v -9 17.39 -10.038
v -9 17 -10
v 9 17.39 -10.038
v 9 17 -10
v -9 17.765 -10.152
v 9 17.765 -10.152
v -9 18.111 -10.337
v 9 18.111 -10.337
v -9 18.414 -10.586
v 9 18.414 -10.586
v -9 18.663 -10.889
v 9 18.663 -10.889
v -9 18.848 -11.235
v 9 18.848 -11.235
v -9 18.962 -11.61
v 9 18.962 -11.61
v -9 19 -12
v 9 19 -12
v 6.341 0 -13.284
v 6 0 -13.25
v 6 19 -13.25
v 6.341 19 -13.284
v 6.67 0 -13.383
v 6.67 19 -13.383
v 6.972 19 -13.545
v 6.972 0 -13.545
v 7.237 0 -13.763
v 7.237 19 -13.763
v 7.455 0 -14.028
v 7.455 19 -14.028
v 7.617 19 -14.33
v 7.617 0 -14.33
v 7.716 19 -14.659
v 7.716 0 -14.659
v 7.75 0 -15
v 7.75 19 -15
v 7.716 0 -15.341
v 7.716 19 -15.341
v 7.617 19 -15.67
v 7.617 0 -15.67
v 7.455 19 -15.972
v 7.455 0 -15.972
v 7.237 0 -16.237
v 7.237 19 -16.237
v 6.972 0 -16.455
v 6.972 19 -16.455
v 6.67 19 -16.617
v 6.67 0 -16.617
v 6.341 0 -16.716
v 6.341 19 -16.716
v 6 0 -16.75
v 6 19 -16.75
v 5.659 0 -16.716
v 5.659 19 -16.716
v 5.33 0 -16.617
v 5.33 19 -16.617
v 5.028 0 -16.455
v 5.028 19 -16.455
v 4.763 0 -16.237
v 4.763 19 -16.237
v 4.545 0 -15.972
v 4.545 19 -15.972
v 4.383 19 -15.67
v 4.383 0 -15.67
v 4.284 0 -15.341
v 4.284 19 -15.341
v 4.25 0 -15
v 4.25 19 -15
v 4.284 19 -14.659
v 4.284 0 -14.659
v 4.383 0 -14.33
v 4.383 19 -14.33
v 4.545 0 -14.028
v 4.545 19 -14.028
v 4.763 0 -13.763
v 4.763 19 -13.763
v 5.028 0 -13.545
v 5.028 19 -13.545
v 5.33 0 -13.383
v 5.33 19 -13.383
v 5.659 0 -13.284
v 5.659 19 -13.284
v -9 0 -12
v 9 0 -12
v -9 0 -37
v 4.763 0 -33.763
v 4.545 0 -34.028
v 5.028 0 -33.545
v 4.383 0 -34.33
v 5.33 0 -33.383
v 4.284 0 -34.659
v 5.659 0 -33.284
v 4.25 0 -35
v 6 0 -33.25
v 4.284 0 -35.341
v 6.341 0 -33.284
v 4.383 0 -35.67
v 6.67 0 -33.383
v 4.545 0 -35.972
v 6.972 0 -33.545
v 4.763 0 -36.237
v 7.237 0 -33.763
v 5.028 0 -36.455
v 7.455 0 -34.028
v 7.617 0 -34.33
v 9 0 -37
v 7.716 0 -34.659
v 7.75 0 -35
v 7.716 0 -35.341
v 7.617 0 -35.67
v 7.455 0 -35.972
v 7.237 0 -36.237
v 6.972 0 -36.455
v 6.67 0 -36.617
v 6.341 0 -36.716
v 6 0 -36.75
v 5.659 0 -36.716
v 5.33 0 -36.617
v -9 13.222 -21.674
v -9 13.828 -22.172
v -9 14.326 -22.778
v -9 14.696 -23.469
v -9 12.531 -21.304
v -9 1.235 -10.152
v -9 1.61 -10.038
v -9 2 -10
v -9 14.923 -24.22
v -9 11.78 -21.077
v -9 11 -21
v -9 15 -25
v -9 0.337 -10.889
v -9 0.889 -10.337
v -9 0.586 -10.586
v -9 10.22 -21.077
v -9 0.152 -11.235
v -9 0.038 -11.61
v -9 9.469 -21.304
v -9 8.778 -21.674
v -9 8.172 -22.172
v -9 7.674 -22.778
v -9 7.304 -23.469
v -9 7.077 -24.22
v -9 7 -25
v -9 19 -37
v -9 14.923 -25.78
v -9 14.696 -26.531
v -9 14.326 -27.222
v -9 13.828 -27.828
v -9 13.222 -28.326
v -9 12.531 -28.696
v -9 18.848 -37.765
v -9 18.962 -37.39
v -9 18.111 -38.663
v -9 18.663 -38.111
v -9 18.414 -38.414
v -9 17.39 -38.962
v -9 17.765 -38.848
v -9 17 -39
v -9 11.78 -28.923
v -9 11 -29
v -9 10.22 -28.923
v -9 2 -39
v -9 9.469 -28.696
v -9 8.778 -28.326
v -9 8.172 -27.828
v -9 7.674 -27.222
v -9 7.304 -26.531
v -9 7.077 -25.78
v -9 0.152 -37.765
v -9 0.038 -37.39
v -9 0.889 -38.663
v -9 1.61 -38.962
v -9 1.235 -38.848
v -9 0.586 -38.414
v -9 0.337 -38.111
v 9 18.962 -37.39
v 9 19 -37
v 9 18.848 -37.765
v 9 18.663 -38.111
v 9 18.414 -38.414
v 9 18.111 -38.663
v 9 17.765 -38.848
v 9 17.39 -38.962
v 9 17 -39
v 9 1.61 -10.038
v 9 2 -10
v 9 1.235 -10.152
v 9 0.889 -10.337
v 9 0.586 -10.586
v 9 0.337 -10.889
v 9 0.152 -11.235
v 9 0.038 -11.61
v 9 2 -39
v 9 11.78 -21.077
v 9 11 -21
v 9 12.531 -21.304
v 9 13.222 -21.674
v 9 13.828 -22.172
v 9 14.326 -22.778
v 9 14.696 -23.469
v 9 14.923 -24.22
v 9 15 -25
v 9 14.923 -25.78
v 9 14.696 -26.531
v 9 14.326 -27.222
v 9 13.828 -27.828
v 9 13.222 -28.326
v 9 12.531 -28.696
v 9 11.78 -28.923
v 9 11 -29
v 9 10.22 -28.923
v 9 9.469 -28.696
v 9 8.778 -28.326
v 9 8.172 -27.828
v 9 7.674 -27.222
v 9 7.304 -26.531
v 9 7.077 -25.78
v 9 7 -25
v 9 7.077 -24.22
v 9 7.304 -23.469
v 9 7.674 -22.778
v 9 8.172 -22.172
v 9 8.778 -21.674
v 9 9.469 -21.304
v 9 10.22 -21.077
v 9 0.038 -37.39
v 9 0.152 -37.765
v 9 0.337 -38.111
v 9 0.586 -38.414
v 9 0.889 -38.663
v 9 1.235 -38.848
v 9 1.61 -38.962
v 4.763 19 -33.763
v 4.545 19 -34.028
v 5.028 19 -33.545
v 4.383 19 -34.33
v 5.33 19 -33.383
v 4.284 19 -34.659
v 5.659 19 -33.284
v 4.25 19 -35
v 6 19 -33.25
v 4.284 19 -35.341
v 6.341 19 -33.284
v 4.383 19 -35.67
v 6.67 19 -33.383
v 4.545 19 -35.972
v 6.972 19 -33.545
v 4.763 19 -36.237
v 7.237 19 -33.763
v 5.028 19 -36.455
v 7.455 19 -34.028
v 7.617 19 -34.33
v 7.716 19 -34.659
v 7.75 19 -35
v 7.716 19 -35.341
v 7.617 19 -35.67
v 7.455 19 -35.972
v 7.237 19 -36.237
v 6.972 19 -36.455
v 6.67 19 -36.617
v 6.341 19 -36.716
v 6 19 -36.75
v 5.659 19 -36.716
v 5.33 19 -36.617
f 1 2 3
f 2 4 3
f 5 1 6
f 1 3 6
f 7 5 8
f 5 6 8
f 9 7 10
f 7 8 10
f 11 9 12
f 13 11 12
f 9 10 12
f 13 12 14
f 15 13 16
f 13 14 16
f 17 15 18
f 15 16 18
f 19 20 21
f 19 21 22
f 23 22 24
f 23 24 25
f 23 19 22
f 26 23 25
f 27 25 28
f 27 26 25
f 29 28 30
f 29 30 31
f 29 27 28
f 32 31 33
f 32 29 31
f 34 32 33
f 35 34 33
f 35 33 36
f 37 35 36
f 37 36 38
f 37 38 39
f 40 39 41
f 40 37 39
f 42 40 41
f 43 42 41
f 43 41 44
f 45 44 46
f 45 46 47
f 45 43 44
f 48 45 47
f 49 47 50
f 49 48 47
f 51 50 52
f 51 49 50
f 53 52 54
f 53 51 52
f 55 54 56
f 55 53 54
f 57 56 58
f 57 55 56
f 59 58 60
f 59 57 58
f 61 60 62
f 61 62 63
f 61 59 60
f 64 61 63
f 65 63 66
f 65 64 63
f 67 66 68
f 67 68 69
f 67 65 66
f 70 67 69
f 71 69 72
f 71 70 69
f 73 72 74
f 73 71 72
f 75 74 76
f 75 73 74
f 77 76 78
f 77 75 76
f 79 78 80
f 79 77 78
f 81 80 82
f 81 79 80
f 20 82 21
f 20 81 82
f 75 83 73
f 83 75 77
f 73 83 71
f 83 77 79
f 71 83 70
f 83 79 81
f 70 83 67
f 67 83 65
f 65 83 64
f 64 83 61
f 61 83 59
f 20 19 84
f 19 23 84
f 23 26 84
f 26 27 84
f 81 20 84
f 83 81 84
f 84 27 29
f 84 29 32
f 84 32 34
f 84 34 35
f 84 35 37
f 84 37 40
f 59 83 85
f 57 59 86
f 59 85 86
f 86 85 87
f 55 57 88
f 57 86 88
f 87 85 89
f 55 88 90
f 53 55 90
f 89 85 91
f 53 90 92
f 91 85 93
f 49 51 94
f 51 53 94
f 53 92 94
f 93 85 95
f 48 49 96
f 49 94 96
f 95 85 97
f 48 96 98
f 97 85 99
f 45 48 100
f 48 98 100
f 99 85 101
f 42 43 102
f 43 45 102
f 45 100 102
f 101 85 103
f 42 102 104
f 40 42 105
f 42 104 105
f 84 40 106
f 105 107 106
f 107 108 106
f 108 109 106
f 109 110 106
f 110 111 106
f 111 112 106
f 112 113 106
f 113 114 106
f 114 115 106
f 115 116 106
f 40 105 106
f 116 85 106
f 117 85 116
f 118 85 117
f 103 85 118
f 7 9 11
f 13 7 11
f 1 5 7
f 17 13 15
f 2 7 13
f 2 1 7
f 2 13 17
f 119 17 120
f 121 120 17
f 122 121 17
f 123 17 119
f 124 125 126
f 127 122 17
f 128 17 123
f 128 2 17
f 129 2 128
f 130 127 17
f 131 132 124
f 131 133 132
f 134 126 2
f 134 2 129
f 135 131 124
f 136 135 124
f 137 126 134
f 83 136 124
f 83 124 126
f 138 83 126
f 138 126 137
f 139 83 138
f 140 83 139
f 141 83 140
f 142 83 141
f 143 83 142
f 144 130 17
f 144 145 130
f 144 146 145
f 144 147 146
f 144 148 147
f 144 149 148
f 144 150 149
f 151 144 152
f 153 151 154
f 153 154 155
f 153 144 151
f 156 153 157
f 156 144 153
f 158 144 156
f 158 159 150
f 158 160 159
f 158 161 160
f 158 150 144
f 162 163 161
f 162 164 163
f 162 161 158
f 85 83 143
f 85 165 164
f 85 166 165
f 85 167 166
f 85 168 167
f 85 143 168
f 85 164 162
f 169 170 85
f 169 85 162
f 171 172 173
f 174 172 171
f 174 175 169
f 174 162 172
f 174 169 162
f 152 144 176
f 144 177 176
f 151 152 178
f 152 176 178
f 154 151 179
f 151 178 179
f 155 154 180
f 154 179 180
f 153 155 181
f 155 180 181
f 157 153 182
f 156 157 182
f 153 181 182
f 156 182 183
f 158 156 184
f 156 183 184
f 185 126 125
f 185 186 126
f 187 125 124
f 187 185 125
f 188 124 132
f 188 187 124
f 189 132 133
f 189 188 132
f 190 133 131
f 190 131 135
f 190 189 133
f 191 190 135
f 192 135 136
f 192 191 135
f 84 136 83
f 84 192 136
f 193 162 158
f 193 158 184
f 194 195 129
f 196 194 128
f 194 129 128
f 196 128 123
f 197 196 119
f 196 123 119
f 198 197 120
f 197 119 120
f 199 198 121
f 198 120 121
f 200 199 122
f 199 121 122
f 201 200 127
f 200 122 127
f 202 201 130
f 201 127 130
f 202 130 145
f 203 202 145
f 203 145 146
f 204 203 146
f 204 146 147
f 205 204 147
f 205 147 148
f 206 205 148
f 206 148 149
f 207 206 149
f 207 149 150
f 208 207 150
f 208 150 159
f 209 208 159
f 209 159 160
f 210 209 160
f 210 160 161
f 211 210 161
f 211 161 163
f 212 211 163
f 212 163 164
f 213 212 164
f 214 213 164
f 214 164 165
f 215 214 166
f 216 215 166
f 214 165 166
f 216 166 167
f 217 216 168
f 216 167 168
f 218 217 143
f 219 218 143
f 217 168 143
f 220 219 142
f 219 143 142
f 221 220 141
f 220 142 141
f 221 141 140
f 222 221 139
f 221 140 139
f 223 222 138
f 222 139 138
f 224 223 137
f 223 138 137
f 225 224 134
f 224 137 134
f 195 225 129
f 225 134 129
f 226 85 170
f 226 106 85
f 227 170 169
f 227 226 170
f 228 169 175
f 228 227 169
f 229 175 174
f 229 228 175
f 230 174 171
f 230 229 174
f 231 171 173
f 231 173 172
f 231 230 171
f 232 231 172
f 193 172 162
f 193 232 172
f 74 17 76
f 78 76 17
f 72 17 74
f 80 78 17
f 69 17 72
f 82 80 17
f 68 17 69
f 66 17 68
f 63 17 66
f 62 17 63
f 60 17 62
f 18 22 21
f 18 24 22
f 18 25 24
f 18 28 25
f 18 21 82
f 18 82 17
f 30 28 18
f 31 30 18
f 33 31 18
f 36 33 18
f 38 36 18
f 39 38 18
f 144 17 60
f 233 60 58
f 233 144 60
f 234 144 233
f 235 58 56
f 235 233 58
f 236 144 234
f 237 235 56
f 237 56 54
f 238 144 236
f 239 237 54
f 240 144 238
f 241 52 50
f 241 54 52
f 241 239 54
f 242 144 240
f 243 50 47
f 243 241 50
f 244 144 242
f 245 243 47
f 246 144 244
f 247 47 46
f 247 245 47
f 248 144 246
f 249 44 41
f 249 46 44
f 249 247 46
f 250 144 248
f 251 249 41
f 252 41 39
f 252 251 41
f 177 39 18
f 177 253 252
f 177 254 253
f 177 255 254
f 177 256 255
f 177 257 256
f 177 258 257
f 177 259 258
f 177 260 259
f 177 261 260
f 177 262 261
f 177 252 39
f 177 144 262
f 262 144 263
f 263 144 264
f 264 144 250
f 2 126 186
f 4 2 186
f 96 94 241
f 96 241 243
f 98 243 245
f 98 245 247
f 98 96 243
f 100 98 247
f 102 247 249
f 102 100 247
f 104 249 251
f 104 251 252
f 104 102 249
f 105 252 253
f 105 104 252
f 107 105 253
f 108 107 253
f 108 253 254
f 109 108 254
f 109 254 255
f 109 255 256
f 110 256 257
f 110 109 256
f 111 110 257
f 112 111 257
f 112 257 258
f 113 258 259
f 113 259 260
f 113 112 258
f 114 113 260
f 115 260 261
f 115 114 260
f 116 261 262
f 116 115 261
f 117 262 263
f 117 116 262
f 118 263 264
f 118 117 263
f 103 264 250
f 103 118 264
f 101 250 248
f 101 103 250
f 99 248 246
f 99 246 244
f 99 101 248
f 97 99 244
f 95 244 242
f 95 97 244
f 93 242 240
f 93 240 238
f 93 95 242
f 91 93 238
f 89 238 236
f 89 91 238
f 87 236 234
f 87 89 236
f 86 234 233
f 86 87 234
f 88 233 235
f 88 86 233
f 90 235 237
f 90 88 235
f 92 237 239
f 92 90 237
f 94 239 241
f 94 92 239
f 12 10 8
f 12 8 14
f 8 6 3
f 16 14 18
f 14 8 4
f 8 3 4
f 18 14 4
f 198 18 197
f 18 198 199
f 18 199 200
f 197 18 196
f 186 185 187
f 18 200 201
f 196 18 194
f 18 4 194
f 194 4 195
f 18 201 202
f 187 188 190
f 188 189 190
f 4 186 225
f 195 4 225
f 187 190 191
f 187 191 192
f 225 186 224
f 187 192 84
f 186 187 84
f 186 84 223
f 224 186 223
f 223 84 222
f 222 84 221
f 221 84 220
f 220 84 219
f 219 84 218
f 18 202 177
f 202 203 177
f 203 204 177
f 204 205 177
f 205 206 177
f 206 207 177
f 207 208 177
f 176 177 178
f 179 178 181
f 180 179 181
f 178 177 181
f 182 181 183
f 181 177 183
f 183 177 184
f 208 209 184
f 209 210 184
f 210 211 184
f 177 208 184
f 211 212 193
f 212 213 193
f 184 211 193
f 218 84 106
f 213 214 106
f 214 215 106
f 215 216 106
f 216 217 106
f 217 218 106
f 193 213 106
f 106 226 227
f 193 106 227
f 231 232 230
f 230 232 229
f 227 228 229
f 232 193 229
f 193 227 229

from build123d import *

# Parameters (mm, degrees)
SKETCH_1_W          = 18
SKETCH_1_H          = 29
SKETCH_1_R          = 1.75
EXTRUDE_1_DEPTH     = 19
SKETCH_2_R          = 4
CUT_EXTRUDE_1_DEPTH = 20
FILLET_1_R          = 2


with BuildPart() as part:
    # 草图1 → 凸台-拉伸1 (new body)
    with BuildSketch(Plane(origin=(0, 0, 0), x_dir=(1, 0, 0), z_dir=(0, 1, 0))):
        with Locations((0, 24.5)):
            Rectangle(SKETCH_1_W, SKETCH_1_H)
        with Locations(Location((6, 15, 0), (0, 0, 270))):
            Circle(SKETCH_1_R, mode=Mode.SUBTRACT)
        with Locations(Location((6, 35, 0), (0, 0, 270))):
            Circle(SKETCH_1_R, mode=Mode.SUBTRACT)
    extrude(amount=EXTRUDE_1_DEPTH)

    # 草图2 → 切除-拉伸1 (cut)
    with BuildSketch(Plane.ZY.offset(9)):
        with Locations((-25, 11)):
            Circle(SKETCH_2_R)
        with Locations((-5, 11)):
            Circle(SKETCH_2_R)
    extrude(amount=-CUT_EXTRUDE_1_DEPTH, mode=Mode.SUBTRACT)

    # 圆角1
    fillet_1_edges = [part.edges().sort_by_distance(p)[0] for p in [
        (0, 19, -10),
        (0, 0, -10),
        (0, 0, -39),
        (0, 19, -39),
    ]]
    fillet(fillet_1_edges, radius=FILLET_1_R)


solid = part.part
